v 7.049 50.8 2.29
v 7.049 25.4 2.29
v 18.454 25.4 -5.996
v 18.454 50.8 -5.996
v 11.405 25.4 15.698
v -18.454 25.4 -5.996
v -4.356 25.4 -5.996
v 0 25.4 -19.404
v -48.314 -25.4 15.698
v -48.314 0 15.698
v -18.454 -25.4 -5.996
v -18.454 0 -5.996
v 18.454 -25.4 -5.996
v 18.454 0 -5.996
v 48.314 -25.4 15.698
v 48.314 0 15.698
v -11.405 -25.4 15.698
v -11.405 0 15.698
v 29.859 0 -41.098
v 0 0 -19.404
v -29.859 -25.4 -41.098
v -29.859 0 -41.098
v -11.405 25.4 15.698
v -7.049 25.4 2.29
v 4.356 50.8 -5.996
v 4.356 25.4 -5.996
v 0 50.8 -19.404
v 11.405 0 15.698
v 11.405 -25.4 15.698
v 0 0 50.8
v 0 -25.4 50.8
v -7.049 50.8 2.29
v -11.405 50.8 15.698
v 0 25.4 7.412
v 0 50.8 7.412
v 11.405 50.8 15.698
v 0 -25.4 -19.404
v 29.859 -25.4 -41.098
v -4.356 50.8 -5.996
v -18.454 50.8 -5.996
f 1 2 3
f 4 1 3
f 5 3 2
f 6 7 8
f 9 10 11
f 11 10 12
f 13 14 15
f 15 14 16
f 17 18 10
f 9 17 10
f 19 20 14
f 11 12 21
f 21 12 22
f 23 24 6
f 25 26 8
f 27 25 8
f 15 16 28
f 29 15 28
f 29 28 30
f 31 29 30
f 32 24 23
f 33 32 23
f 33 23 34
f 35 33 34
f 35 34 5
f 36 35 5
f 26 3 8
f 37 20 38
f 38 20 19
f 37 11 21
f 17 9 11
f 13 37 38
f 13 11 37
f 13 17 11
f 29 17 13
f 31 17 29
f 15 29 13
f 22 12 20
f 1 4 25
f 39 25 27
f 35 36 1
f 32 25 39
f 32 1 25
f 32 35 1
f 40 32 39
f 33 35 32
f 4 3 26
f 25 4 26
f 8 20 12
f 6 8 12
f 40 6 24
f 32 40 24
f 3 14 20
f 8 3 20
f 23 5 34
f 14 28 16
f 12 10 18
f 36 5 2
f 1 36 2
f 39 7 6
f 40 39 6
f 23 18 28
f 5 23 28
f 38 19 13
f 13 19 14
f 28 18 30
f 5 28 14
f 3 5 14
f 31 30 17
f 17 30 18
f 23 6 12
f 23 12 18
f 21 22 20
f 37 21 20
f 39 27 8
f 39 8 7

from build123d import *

# Parameters (mm, degrees)
F1_DEPTH = 25.4
F3_DEPTH = 25.4
F5_DEPTH = 25.4


with BuildPart() as f1:
    # F0 (on Front) → F1 (new body)
    with BuildSketch(Plane.XZ):
        Polygon((-18.4541802113, -5.9961266285), (-29.8594908165, -41.0980633142), (0, -19.4038733715), align=None)
        Polygon((-11.4053106051, 15.6980633142), (-48.3136710278, 15.6980633142), (-18.4541802113, -5.9961266285), align=None)
        Polygon((18.4541802113, -5.9961266285), (11.4053106051, 15.6980633142), (-11.4053106051, 15.6980633142), (-18.4541802113, -5.9961266285), (0, -19.4038733715), align=None)
        Polygon((11.4053106051, 15.6980633142), (0, 50.8), (-11.4053106051, 15.6980633142), align=None)
        Polygon((18.4541802113, -5.9961266285), (48.3136710278, 15.6980633142), (11.4053106051, 15.6980633142), align=None)
        Polygon((0, -19.4038733715), (29.8594908165, -41.0980633142), (18.4541802113, -5.9961266285), align=None)
    extrude(amount=F1_DEPTH)

    # F2 (on face) → F3 (join)
    with BuildSketch(Plane(origin=(0, 0, 0), x_dir=(-1, 0, 0), z_dir=(0, 1, 0))):
        Polygon((-11.4053106051, 15.6980633142), (-18.4541802113, -5.9961266285), (0, -19.4038733715), (18.4541802113, -5.9961266285), (11.4053106051, 15.6980633142), align=None)
    extrude(amount=F3_DEPTH)

    # F4 (on face) → F5 (join)
    with BuildSketch(Plane(origin=(0, 25.4, 0), x_dir=(-1, 0, 0), z_dir=(0, 1, 0))):
        Polygon((7.0488696062, 2.2903165712), (4.3564409989, -5.9961266285), (18.4541802113, -5.9961266285), align=None)
        Polygon((11.4053106051, 15.6980633142), (0, 7.4116201145), (7.0488696062, 2.2903165712), align=None)
        Polygon((0, 7.4116201145), (-7.0488696062, 2.2903165712), (-4.3564409989, -5.9961266285), (4.3564409989, -5.9961266285), (7.0488696062, 2.2903165712), align=None)
        Polygon((-11.4053106051, 15.6980633142), (-7.0488696062, 2.2903165712), (0, 7.4116201145), align=None)
        Polygon((-7.0488696062, 2.2903165712), (-18.4541802113, -5.9961266285), (-4.3564409989, -5.9961266285), align=None)
        Polygon((4.3564409989, -5.9961266285), (-4.3564409989, -5.9961266285), (0, -19.4038733715), align=None)
    extrude(amount=F5_DEPTH)


solid = f1.part
